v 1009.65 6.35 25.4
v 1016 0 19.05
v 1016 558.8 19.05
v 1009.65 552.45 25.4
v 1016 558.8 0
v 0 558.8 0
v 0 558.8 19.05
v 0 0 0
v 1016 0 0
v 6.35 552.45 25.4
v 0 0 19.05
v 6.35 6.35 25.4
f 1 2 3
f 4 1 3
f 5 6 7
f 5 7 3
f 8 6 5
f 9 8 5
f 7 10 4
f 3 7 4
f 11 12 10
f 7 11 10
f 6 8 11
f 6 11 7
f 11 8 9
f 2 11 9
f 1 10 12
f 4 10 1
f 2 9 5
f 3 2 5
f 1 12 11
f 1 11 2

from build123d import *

# Parameters (mm, degrees)
F0_W     = 1016
F0_H     = 558.8
F1_DEPTH = 25.4
F2_DEPTH = 25.4
F3_SIZE  = 6.35


with BuildPart() as f1:
    # F0 (on Top) → F1 (new body)
    with BuildSketch(Plane.XY):
        with Locations((508, 279.4)):
            Rectangle(F0_W, F0_H)
    extrude(amount=F1_DEPTH)

    # F0 (on Top) → F2 (join)
    with BuildSketch(Plane.XY):
        with Locations((508, 279.4)):
            Rectangle(F0_W, F0_H)
    extrude(amount=F2_DEPTH)

    # F3
    f3_edges = [f1.edges().sort_by_distance(p)[0] for p in [
        (0, 279.4, 25.4),
        (508, 0, 25.4),
        (1016, 279.4, 25.4),
        (508, 558.8, 25.4),
    ]]
    chamfer(f3_edges, length=F3_SIZE)


solid = f1.part
